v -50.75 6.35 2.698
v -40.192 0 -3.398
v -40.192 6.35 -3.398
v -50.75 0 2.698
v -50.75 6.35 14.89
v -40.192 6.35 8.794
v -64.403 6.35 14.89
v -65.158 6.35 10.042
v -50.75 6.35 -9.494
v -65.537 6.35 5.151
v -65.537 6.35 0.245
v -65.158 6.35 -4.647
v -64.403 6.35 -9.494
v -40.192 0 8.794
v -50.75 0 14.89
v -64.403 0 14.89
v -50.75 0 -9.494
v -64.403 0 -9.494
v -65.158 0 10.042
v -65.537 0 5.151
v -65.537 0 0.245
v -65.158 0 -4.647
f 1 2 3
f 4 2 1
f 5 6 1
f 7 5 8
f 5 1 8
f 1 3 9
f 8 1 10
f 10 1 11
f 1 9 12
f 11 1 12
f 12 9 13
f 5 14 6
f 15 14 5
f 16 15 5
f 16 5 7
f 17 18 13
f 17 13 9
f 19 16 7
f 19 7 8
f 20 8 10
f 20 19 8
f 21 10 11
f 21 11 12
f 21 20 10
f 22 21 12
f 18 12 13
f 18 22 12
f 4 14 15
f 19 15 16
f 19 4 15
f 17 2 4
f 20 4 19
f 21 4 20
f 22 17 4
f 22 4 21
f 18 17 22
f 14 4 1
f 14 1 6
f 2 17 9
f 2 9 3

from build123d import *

# Parameters (mm, degrees)
BOSS_EXTRUDE1_DEPTH = 6.35


with BuildPart() as part:
    # Sketch2 → Boss-Extrude1 (new body)
    with BuildSketch(Plane(origin=(0, 0, 0), x_dir=(1, 0, 0), z_dir=(0, 1, 0))):
        with BuildLine():
            Line((-50.75013925, 9.494238665), (-40.191557527, 3.398238665))
            Line((-40.191557527, 3.398238665), (-50.75013925, -2.697761335))
            Line((-50.75013925, -2.697761335), (-40.191557527, -8.793761335))
            Line((-40.191557527, -8.793761335), (-50.75013925, -14.889761335))
            Line((-50.75013925, -14.889761335), (-64.40263925, -14.889761335))
            ThreePointArc((-64.40263925, -14.889761335), (-65.584061474, -2.697761335), (-64.40263925, 9.494238665))
            Line((-64.40263925, 9.494238665), (-50.75013925, 9.494238665))
        make_face()
    extrude(amount=BOSS_EXTRUDE1_DEPTH)


solid = part.part
